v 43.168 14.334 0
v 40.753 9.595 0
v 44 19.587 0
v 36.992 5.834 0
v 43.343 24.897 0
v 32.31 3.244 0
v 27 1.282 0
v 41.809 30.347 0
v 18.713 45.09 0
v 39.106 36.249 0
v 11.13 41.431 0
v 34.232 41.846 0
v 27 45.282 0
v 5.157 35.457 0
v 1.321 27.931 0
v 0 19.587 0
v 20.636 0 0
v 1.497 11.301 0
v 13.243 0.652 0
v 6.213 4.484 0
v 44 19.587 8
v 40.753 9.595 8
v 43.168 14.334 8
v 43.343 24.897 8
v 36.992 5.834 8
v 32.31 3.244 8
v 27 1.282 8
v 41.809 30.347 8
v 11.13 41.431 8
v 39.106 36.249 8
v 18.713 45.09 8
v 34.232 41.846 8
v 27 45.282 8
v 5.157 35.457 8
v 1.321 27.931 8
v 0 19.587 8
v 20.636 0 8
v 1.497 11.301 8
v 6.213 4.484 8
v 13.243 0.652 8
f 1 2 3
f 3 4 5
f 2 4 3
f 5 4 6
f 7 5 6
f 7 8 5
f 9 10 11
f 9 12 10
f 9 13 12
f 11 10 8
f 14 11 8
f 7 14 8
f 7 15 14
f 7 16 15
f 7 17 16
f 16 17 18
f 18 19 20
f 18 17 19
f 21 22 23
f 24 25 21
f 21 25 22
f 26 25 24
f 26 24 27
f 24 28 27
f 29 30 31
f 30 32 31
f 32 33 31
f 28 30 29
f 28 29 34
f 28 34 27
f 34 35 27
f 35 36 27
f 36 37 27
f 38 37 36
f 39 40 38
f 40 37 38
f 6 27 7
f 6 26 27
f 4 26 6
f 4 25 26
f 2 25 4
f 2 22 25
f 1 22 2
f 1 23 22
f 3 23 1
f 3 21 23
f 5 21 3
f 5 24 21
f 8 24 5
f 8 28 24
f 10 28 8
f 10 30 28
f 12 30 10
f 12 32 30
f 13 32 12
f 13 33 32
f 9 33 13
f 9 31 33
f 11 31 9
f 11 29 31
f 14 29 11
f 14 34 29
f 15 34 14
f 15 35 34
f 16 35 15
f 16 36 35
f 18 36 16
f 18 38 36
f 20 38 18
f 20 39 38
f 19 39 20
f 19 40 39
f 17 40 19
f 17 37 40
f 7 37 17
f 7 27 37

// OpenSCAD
$fn = 32;

// ----------------------------------------------------------------------
// Cam disc: base radius 17.0 mm, lift 10.0 mm, 20 profile points
// ----------------------------------------------------------------------

// --- parameters (mm) ---
profile_height = 8;       // extrusion height
profile_points = 20;      // points of the closed outline

profile = [[44, 19.587], [43.343, 24.897], [41.809, 30.347], [39.106, 36.249], [34.232, 41.846], [27, 45.282], [18.713, 45.09], [11.13, 41.431], [5.157, 35.457], [1.321, 27.931], [0, 19.587], [1.497, 11.301], [6.213, 4.484], [13.243, 0.652], [20.636, 0], [27, 1.282], [32.31, 3.244], [36.992, 5.834], [40.753, 9.595], [43.168, 14.334]];  // single closed polygon, 20 points, counter clockwise

// --- the one profile operation ---
linear_extrude(height = profile_height) polygon(points = profile);
